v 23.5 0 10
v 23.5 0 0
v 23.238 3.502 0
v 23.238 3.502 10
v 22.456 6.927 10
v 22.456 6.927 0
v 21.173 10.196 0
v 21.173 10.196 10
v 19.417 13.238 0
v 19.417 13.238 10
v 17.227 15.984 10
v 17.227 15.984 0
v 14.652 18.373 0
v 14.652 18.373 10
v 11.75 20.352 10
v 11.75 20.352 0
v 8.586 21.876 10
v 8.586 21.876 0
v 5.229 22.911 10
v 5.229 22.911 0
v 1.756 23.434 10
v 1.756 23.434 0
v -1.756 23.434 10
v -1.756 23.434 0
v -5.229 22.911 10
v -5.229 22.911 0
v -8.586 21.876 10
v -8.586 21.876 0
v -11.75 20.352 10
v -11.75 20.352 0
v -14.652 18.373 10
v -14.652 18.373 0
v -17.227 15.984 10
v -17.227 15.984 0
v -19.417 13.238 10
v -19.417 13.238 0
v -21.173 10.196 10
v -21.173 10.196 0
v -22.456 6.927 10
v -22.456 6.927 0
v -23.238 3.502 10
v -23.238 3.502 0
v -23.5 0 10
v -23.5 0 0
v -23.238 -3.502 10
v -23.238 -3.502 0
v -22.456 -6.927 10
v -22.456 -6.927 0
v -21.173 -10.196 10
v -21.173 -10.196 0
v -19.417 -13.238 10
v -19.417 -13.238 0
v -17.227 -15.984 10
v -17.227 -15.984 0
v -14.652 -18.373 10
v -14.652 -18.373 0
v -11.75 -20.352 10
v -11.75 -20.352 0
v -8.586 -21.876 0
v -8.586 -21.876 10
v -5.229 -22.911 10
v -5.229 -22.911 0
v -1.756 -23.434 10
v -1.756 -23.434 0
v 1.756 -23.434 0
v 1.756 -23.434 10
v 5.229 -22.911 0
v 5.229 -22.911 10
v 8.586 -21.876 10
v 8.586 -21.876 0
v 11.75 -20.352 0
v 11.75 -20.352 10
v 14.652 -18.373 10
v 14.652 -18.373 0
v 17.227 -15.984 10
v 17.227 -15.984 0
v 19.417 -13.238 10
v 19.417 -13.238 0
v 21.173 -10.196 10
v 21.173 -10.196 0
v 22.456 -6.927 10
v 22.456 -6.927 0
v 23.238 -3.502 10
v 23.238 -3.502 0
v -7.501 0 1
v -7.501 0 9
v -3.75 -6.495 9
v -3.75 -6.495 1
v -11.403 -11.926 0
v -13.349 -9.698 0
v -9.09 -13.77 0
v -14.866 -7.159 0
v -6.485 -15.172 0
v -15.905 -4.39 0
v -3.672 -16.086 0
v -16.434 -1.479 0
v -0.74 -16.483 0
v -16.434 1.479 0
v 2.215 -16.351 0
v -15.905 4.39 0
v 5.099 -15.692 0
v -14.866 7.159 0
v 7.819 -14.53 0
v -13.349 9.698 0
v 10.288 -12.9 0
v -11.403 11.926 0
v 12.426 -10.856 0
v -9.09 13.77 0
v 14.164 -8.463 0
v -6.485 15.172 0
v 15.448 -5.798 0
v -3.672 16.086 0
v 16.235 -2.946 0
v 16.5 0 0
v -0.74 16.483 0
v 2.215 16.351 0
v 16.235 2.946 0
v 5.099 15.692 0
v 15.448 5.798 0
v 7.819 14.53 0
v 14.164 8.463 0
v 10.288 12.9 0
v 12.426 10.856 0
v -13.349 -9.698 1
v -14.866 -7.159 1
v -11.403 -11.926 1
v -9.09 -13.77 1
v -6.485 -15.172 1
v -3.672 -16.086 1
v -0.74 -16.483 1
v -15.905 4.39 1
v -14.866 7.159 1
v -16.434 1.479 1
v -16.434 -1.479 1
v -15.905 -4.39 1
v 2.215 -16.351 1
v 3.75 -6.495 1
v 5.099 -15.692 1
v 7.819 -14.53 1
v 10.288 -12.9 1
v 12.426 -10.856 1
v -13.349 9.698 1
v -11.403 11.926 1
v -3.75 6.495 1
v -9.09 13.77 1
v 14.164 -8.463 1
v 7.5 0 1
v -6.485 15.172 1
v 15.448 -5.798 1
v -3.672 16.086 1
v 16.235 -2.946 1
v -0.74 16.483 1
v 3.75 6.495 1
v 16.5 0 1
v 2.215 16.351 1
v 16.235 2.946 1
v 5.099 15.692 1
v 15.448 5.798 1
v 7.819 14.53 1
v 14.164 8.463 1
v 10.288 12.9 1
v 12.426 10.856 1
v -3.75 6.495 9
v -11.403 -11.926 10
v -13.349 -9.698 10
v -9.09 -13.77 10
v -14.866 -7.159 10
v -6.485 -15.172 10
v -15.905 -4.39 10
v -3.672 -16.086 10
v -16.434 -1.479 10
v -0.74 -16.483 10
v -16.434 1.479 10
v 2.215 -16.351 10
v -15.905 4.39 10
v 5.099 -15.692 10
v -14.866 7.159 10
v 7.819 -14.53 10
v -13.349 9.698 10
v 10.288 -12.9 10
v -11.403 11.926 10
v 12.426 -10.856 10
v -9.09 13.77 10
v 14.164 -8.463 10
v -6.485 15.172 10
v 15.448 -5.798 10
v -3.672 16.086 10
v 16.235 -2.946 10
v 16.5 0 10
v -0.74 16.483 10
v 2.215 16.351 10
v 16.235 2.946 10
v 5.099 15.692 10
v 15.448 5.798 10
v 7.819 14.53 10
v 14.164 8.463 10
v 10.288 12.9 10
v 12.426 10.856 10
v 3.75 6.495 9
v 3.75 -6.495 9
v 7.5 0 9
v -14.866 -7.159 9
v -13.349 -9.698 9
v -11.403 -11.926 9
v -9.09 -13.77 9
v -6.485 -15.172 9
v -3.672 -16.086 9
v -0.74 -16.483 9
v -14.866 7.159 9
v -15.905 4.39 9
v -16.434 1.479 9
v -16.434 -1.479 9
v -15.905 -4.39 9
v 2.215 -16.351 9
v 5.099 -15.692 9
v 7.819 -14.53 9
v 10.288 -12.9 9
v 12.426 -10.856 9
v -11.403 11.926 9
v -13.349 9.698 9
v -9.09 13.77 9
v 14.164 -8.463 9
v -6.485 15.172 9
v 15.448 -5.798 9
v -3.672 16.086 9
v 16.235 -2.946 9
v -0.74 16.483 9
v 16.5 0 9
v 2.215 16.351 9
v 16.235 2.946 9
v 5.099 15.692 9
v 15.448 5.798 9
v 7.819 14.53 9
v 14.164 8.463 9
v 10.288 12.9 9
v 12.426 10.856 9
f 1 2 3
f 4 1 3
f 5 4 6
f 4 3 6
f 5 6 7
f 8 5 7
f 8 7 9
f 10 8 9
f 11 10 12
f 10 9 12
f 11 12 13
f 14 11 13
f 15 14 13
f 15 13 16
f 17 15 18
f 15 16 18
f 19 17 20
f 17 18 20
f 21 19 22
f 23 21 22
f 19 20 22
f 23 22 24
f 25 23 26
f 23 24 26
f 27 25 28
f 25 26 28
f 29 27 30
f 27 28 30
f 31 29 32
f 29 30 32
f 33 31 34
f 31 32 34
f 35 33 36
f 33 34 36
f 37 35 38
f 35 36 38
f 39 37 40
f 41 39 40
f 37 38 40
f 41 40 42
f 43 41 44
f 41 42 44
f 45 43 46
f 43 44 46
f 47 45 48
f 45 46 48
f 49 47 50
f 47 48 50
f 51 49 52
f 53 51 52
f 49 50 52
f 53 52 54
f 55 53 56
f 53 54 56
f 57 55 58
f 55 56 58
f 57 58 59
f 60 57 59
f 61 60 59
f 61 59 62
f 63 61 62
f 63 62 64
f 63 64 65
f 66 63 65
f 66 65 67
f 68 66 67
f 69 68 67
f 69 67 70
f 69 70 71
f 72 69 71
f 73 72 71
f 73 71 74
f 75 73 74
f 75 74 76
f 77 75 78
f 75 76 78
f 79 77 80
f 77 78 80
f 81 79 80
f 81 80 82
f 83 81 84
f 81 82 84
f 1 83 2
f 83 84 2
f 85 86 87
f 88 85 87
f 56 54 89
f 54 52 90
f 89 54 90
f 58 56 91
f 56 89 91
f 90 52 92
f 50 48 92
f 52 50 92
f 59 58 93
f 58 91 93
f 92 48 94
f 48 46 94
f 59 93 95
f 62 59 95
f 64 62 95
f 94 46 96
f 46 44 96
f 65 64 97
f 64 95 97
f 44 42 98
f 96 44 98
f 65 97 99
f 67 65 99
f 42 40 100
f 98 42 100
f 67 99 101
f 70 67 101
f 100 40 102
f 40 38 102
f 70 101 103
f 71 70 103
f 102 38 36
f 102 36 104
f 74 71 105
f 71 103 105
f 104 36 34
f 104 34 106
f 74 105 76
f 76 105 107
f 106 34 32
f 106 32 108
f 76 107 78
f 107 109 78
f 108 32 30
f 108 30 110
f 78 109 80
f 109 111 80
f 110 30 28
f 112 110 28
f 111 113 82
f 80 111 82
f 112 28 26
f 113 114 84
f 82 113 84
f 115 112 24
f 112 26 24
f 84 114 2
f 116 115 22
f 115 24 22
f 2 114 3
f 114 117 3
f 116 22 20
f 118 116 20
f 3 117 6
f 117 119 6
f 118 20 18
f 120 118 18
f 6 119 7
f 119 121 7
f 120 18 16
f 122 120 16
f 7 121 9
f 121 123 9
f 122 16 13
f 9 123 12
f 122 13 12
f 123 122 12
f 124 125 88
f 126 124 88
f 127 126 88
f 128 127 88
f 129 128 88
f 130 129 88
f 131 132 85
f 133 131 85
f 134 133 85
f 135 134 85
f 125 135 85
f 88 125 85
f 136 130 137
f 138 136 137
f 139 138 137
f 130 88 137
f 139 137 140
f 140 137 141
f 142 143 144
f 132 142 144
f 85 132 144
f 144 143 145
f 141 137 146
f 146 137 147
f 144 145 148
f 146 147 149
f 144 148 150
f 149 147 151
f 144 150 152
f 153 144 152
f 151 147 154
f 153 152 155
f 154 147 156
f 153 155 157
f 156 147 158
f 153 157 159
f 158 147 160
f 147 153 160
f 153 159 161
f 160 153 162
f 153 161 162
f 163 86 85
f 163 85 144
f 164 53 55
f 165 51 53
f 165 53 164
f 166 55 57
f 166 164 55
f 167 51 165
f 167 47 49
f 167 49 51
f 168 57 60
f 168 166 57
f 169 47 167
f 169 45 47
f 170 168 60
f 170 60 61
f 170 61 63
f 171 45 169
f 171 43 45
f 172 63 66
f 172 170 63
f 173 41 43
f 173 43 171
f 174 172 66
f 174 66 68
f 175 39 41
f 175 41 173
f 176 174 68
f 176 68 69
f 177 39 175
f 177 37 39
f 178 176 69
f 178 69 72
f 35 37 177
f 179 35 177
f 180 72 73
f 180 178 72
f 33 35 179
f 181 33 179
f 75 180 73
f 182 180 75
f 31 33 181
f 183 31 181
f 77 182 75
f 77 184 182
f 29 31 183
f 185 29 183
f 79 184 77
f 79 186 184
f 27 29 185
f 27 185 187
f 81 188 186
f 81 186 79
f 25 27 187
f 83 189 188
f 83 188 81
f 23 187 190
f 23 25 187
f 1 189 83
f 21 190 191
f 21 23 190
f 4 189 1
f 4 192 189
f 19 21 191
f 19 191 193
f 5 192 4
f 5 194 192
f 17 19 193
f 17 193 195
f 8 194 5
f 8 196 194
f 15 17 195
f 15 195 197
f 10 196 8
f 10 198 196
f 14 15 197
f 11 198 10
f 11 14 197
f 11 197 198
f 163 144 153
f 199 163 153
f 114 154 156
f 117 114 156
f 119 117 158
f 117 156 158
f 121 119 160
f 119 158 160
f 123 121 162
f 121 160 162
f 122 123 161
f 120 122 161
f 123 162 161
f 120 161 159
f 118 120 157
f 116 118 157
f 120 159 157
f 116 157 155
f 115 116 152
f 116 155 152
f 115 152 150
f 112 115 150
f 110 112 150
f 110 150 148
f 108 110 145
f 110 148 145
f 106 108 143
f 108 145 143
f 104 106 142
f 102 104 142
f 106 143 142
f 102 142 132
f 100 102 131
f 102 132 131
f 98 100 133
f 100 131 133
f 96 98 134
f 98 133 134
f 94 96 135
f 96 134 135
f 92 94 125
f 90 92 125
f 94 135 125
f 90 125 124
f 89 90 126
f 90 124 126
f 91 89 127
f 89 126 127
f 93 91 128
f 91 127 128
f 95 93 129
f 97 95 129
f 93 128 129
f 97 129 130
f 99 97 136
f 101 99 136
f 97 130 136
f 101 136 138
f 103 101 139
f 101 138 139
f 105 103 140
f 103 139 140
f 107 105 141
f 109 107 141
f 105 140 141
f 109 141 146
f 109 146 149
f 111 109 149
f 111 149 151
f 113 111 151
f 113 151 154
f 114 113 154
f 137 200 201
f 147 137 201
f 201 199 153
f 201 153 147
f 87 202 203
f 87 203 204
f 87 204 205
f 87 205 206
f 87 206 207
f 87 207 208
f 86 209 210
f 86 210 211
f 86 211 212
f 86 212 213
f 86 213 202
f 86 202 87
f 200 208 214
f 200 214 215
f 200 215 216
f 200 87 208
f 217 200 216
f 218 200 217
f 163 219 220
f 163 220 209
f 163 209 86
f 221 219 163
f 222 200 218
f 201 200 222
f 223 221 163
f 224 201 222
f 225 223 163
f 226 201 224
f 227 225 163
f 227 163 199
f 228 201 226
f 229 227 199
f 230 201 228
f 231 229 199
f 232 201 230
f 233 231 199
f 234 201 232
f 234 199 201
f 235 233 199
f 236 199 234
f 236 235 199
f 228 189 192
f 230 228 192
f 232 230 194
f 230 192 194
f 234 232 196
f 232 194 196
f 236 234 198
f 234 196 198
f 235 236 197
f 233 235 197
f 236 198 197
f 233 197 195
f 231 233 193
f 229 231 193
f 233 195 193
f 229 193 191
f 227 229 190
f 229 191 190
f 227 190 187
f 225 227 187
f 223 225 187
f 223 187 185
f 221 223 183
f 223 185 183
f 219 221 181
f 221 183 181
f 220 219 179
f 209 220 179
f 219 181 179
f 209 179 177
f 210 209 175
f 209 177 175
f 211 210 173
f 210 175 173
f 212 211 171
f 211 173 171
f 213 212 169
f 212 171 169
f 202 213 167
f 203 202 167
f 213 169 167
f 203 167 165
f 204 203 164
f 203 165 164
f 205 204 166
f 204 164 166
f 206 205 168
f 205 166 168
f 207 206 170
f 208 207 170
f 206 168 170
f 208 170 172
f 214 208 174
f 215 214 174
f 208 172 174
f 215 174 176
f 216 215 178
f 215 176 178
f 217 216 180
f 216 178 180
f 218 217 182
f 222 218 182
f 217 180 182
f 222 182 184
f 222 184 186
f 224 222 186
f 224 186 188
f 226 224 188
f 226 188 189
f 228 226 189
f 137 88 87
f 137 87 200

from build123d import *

# Parameters (mm, degrees)
ESQUISSE1_R                = 23.5
BOSS_EXTRU_1_DEPTH         = 10
ENL_V_MAT_EXTRU_1_DEPTH    = 10
ESQUISSE4_R                = 16.5
ENL_V_MAT_EXTRU_2_DEPTH    = 1
R_P_TITION_LIN_AIRE1_COUNT = 2
R_P_TITION_LIN_AIRE1_PITCH = 9


with BuildPart() as part:
    # Esquisse1 → Boss.-Extru.1 (new body)
    with BuildSketch(Plane.XY):
        Circle(ESQUISSE1_R)
    extrude(amount=BOSS_EXTRU_1_DEPTH)

    # Esquisse3 → Enlèv. mat.-Extru.1 (cut)
    with BuildSketch(Plane.XY.offset(10)):
        Polygon((-7.501301233, 0), (-3.749717926, 6.494701961), (3.75, 6.495190528), (7.5, 0), align=None)
    enl_v_mat_extru_1 = extrude(amount=-ENL_V_MAT_EXTRU_1_DEPTH, mode=Mode.SUBTRACT)

    # Symétrie1: Enlèv. mat.-Extru.1 across plane
    add(enl_v_mat_extru_1.mirror(Plane.ZX), mode=Mode.SUBTRACT)

    # Esquisse4 → Enlèv. mat.-Extru.2 (cut)
    with BuildSketch(Plane.XY.offset(10)):
        Circle(ESQUISSE4_R)
    enl_v_mat_extru_2 = extrude(amount=-ENL_V_MAT_EXTRU_2_DEPTH, mode=Mode.SUBTRACT)

    # Répétition linéaire1: Enlèv. mat.-Extru.2 ×2
    with Locations(*[(0, 0, -i * R_P_TITION_LIN_AIRE1_PITCH) for i in range(1, R_P_TITION_LIN_AIRE1_COUNT)]):
        add(enl_v_mat_extru_2, mode=Mode.SUBTRACT)


solid = part.part
